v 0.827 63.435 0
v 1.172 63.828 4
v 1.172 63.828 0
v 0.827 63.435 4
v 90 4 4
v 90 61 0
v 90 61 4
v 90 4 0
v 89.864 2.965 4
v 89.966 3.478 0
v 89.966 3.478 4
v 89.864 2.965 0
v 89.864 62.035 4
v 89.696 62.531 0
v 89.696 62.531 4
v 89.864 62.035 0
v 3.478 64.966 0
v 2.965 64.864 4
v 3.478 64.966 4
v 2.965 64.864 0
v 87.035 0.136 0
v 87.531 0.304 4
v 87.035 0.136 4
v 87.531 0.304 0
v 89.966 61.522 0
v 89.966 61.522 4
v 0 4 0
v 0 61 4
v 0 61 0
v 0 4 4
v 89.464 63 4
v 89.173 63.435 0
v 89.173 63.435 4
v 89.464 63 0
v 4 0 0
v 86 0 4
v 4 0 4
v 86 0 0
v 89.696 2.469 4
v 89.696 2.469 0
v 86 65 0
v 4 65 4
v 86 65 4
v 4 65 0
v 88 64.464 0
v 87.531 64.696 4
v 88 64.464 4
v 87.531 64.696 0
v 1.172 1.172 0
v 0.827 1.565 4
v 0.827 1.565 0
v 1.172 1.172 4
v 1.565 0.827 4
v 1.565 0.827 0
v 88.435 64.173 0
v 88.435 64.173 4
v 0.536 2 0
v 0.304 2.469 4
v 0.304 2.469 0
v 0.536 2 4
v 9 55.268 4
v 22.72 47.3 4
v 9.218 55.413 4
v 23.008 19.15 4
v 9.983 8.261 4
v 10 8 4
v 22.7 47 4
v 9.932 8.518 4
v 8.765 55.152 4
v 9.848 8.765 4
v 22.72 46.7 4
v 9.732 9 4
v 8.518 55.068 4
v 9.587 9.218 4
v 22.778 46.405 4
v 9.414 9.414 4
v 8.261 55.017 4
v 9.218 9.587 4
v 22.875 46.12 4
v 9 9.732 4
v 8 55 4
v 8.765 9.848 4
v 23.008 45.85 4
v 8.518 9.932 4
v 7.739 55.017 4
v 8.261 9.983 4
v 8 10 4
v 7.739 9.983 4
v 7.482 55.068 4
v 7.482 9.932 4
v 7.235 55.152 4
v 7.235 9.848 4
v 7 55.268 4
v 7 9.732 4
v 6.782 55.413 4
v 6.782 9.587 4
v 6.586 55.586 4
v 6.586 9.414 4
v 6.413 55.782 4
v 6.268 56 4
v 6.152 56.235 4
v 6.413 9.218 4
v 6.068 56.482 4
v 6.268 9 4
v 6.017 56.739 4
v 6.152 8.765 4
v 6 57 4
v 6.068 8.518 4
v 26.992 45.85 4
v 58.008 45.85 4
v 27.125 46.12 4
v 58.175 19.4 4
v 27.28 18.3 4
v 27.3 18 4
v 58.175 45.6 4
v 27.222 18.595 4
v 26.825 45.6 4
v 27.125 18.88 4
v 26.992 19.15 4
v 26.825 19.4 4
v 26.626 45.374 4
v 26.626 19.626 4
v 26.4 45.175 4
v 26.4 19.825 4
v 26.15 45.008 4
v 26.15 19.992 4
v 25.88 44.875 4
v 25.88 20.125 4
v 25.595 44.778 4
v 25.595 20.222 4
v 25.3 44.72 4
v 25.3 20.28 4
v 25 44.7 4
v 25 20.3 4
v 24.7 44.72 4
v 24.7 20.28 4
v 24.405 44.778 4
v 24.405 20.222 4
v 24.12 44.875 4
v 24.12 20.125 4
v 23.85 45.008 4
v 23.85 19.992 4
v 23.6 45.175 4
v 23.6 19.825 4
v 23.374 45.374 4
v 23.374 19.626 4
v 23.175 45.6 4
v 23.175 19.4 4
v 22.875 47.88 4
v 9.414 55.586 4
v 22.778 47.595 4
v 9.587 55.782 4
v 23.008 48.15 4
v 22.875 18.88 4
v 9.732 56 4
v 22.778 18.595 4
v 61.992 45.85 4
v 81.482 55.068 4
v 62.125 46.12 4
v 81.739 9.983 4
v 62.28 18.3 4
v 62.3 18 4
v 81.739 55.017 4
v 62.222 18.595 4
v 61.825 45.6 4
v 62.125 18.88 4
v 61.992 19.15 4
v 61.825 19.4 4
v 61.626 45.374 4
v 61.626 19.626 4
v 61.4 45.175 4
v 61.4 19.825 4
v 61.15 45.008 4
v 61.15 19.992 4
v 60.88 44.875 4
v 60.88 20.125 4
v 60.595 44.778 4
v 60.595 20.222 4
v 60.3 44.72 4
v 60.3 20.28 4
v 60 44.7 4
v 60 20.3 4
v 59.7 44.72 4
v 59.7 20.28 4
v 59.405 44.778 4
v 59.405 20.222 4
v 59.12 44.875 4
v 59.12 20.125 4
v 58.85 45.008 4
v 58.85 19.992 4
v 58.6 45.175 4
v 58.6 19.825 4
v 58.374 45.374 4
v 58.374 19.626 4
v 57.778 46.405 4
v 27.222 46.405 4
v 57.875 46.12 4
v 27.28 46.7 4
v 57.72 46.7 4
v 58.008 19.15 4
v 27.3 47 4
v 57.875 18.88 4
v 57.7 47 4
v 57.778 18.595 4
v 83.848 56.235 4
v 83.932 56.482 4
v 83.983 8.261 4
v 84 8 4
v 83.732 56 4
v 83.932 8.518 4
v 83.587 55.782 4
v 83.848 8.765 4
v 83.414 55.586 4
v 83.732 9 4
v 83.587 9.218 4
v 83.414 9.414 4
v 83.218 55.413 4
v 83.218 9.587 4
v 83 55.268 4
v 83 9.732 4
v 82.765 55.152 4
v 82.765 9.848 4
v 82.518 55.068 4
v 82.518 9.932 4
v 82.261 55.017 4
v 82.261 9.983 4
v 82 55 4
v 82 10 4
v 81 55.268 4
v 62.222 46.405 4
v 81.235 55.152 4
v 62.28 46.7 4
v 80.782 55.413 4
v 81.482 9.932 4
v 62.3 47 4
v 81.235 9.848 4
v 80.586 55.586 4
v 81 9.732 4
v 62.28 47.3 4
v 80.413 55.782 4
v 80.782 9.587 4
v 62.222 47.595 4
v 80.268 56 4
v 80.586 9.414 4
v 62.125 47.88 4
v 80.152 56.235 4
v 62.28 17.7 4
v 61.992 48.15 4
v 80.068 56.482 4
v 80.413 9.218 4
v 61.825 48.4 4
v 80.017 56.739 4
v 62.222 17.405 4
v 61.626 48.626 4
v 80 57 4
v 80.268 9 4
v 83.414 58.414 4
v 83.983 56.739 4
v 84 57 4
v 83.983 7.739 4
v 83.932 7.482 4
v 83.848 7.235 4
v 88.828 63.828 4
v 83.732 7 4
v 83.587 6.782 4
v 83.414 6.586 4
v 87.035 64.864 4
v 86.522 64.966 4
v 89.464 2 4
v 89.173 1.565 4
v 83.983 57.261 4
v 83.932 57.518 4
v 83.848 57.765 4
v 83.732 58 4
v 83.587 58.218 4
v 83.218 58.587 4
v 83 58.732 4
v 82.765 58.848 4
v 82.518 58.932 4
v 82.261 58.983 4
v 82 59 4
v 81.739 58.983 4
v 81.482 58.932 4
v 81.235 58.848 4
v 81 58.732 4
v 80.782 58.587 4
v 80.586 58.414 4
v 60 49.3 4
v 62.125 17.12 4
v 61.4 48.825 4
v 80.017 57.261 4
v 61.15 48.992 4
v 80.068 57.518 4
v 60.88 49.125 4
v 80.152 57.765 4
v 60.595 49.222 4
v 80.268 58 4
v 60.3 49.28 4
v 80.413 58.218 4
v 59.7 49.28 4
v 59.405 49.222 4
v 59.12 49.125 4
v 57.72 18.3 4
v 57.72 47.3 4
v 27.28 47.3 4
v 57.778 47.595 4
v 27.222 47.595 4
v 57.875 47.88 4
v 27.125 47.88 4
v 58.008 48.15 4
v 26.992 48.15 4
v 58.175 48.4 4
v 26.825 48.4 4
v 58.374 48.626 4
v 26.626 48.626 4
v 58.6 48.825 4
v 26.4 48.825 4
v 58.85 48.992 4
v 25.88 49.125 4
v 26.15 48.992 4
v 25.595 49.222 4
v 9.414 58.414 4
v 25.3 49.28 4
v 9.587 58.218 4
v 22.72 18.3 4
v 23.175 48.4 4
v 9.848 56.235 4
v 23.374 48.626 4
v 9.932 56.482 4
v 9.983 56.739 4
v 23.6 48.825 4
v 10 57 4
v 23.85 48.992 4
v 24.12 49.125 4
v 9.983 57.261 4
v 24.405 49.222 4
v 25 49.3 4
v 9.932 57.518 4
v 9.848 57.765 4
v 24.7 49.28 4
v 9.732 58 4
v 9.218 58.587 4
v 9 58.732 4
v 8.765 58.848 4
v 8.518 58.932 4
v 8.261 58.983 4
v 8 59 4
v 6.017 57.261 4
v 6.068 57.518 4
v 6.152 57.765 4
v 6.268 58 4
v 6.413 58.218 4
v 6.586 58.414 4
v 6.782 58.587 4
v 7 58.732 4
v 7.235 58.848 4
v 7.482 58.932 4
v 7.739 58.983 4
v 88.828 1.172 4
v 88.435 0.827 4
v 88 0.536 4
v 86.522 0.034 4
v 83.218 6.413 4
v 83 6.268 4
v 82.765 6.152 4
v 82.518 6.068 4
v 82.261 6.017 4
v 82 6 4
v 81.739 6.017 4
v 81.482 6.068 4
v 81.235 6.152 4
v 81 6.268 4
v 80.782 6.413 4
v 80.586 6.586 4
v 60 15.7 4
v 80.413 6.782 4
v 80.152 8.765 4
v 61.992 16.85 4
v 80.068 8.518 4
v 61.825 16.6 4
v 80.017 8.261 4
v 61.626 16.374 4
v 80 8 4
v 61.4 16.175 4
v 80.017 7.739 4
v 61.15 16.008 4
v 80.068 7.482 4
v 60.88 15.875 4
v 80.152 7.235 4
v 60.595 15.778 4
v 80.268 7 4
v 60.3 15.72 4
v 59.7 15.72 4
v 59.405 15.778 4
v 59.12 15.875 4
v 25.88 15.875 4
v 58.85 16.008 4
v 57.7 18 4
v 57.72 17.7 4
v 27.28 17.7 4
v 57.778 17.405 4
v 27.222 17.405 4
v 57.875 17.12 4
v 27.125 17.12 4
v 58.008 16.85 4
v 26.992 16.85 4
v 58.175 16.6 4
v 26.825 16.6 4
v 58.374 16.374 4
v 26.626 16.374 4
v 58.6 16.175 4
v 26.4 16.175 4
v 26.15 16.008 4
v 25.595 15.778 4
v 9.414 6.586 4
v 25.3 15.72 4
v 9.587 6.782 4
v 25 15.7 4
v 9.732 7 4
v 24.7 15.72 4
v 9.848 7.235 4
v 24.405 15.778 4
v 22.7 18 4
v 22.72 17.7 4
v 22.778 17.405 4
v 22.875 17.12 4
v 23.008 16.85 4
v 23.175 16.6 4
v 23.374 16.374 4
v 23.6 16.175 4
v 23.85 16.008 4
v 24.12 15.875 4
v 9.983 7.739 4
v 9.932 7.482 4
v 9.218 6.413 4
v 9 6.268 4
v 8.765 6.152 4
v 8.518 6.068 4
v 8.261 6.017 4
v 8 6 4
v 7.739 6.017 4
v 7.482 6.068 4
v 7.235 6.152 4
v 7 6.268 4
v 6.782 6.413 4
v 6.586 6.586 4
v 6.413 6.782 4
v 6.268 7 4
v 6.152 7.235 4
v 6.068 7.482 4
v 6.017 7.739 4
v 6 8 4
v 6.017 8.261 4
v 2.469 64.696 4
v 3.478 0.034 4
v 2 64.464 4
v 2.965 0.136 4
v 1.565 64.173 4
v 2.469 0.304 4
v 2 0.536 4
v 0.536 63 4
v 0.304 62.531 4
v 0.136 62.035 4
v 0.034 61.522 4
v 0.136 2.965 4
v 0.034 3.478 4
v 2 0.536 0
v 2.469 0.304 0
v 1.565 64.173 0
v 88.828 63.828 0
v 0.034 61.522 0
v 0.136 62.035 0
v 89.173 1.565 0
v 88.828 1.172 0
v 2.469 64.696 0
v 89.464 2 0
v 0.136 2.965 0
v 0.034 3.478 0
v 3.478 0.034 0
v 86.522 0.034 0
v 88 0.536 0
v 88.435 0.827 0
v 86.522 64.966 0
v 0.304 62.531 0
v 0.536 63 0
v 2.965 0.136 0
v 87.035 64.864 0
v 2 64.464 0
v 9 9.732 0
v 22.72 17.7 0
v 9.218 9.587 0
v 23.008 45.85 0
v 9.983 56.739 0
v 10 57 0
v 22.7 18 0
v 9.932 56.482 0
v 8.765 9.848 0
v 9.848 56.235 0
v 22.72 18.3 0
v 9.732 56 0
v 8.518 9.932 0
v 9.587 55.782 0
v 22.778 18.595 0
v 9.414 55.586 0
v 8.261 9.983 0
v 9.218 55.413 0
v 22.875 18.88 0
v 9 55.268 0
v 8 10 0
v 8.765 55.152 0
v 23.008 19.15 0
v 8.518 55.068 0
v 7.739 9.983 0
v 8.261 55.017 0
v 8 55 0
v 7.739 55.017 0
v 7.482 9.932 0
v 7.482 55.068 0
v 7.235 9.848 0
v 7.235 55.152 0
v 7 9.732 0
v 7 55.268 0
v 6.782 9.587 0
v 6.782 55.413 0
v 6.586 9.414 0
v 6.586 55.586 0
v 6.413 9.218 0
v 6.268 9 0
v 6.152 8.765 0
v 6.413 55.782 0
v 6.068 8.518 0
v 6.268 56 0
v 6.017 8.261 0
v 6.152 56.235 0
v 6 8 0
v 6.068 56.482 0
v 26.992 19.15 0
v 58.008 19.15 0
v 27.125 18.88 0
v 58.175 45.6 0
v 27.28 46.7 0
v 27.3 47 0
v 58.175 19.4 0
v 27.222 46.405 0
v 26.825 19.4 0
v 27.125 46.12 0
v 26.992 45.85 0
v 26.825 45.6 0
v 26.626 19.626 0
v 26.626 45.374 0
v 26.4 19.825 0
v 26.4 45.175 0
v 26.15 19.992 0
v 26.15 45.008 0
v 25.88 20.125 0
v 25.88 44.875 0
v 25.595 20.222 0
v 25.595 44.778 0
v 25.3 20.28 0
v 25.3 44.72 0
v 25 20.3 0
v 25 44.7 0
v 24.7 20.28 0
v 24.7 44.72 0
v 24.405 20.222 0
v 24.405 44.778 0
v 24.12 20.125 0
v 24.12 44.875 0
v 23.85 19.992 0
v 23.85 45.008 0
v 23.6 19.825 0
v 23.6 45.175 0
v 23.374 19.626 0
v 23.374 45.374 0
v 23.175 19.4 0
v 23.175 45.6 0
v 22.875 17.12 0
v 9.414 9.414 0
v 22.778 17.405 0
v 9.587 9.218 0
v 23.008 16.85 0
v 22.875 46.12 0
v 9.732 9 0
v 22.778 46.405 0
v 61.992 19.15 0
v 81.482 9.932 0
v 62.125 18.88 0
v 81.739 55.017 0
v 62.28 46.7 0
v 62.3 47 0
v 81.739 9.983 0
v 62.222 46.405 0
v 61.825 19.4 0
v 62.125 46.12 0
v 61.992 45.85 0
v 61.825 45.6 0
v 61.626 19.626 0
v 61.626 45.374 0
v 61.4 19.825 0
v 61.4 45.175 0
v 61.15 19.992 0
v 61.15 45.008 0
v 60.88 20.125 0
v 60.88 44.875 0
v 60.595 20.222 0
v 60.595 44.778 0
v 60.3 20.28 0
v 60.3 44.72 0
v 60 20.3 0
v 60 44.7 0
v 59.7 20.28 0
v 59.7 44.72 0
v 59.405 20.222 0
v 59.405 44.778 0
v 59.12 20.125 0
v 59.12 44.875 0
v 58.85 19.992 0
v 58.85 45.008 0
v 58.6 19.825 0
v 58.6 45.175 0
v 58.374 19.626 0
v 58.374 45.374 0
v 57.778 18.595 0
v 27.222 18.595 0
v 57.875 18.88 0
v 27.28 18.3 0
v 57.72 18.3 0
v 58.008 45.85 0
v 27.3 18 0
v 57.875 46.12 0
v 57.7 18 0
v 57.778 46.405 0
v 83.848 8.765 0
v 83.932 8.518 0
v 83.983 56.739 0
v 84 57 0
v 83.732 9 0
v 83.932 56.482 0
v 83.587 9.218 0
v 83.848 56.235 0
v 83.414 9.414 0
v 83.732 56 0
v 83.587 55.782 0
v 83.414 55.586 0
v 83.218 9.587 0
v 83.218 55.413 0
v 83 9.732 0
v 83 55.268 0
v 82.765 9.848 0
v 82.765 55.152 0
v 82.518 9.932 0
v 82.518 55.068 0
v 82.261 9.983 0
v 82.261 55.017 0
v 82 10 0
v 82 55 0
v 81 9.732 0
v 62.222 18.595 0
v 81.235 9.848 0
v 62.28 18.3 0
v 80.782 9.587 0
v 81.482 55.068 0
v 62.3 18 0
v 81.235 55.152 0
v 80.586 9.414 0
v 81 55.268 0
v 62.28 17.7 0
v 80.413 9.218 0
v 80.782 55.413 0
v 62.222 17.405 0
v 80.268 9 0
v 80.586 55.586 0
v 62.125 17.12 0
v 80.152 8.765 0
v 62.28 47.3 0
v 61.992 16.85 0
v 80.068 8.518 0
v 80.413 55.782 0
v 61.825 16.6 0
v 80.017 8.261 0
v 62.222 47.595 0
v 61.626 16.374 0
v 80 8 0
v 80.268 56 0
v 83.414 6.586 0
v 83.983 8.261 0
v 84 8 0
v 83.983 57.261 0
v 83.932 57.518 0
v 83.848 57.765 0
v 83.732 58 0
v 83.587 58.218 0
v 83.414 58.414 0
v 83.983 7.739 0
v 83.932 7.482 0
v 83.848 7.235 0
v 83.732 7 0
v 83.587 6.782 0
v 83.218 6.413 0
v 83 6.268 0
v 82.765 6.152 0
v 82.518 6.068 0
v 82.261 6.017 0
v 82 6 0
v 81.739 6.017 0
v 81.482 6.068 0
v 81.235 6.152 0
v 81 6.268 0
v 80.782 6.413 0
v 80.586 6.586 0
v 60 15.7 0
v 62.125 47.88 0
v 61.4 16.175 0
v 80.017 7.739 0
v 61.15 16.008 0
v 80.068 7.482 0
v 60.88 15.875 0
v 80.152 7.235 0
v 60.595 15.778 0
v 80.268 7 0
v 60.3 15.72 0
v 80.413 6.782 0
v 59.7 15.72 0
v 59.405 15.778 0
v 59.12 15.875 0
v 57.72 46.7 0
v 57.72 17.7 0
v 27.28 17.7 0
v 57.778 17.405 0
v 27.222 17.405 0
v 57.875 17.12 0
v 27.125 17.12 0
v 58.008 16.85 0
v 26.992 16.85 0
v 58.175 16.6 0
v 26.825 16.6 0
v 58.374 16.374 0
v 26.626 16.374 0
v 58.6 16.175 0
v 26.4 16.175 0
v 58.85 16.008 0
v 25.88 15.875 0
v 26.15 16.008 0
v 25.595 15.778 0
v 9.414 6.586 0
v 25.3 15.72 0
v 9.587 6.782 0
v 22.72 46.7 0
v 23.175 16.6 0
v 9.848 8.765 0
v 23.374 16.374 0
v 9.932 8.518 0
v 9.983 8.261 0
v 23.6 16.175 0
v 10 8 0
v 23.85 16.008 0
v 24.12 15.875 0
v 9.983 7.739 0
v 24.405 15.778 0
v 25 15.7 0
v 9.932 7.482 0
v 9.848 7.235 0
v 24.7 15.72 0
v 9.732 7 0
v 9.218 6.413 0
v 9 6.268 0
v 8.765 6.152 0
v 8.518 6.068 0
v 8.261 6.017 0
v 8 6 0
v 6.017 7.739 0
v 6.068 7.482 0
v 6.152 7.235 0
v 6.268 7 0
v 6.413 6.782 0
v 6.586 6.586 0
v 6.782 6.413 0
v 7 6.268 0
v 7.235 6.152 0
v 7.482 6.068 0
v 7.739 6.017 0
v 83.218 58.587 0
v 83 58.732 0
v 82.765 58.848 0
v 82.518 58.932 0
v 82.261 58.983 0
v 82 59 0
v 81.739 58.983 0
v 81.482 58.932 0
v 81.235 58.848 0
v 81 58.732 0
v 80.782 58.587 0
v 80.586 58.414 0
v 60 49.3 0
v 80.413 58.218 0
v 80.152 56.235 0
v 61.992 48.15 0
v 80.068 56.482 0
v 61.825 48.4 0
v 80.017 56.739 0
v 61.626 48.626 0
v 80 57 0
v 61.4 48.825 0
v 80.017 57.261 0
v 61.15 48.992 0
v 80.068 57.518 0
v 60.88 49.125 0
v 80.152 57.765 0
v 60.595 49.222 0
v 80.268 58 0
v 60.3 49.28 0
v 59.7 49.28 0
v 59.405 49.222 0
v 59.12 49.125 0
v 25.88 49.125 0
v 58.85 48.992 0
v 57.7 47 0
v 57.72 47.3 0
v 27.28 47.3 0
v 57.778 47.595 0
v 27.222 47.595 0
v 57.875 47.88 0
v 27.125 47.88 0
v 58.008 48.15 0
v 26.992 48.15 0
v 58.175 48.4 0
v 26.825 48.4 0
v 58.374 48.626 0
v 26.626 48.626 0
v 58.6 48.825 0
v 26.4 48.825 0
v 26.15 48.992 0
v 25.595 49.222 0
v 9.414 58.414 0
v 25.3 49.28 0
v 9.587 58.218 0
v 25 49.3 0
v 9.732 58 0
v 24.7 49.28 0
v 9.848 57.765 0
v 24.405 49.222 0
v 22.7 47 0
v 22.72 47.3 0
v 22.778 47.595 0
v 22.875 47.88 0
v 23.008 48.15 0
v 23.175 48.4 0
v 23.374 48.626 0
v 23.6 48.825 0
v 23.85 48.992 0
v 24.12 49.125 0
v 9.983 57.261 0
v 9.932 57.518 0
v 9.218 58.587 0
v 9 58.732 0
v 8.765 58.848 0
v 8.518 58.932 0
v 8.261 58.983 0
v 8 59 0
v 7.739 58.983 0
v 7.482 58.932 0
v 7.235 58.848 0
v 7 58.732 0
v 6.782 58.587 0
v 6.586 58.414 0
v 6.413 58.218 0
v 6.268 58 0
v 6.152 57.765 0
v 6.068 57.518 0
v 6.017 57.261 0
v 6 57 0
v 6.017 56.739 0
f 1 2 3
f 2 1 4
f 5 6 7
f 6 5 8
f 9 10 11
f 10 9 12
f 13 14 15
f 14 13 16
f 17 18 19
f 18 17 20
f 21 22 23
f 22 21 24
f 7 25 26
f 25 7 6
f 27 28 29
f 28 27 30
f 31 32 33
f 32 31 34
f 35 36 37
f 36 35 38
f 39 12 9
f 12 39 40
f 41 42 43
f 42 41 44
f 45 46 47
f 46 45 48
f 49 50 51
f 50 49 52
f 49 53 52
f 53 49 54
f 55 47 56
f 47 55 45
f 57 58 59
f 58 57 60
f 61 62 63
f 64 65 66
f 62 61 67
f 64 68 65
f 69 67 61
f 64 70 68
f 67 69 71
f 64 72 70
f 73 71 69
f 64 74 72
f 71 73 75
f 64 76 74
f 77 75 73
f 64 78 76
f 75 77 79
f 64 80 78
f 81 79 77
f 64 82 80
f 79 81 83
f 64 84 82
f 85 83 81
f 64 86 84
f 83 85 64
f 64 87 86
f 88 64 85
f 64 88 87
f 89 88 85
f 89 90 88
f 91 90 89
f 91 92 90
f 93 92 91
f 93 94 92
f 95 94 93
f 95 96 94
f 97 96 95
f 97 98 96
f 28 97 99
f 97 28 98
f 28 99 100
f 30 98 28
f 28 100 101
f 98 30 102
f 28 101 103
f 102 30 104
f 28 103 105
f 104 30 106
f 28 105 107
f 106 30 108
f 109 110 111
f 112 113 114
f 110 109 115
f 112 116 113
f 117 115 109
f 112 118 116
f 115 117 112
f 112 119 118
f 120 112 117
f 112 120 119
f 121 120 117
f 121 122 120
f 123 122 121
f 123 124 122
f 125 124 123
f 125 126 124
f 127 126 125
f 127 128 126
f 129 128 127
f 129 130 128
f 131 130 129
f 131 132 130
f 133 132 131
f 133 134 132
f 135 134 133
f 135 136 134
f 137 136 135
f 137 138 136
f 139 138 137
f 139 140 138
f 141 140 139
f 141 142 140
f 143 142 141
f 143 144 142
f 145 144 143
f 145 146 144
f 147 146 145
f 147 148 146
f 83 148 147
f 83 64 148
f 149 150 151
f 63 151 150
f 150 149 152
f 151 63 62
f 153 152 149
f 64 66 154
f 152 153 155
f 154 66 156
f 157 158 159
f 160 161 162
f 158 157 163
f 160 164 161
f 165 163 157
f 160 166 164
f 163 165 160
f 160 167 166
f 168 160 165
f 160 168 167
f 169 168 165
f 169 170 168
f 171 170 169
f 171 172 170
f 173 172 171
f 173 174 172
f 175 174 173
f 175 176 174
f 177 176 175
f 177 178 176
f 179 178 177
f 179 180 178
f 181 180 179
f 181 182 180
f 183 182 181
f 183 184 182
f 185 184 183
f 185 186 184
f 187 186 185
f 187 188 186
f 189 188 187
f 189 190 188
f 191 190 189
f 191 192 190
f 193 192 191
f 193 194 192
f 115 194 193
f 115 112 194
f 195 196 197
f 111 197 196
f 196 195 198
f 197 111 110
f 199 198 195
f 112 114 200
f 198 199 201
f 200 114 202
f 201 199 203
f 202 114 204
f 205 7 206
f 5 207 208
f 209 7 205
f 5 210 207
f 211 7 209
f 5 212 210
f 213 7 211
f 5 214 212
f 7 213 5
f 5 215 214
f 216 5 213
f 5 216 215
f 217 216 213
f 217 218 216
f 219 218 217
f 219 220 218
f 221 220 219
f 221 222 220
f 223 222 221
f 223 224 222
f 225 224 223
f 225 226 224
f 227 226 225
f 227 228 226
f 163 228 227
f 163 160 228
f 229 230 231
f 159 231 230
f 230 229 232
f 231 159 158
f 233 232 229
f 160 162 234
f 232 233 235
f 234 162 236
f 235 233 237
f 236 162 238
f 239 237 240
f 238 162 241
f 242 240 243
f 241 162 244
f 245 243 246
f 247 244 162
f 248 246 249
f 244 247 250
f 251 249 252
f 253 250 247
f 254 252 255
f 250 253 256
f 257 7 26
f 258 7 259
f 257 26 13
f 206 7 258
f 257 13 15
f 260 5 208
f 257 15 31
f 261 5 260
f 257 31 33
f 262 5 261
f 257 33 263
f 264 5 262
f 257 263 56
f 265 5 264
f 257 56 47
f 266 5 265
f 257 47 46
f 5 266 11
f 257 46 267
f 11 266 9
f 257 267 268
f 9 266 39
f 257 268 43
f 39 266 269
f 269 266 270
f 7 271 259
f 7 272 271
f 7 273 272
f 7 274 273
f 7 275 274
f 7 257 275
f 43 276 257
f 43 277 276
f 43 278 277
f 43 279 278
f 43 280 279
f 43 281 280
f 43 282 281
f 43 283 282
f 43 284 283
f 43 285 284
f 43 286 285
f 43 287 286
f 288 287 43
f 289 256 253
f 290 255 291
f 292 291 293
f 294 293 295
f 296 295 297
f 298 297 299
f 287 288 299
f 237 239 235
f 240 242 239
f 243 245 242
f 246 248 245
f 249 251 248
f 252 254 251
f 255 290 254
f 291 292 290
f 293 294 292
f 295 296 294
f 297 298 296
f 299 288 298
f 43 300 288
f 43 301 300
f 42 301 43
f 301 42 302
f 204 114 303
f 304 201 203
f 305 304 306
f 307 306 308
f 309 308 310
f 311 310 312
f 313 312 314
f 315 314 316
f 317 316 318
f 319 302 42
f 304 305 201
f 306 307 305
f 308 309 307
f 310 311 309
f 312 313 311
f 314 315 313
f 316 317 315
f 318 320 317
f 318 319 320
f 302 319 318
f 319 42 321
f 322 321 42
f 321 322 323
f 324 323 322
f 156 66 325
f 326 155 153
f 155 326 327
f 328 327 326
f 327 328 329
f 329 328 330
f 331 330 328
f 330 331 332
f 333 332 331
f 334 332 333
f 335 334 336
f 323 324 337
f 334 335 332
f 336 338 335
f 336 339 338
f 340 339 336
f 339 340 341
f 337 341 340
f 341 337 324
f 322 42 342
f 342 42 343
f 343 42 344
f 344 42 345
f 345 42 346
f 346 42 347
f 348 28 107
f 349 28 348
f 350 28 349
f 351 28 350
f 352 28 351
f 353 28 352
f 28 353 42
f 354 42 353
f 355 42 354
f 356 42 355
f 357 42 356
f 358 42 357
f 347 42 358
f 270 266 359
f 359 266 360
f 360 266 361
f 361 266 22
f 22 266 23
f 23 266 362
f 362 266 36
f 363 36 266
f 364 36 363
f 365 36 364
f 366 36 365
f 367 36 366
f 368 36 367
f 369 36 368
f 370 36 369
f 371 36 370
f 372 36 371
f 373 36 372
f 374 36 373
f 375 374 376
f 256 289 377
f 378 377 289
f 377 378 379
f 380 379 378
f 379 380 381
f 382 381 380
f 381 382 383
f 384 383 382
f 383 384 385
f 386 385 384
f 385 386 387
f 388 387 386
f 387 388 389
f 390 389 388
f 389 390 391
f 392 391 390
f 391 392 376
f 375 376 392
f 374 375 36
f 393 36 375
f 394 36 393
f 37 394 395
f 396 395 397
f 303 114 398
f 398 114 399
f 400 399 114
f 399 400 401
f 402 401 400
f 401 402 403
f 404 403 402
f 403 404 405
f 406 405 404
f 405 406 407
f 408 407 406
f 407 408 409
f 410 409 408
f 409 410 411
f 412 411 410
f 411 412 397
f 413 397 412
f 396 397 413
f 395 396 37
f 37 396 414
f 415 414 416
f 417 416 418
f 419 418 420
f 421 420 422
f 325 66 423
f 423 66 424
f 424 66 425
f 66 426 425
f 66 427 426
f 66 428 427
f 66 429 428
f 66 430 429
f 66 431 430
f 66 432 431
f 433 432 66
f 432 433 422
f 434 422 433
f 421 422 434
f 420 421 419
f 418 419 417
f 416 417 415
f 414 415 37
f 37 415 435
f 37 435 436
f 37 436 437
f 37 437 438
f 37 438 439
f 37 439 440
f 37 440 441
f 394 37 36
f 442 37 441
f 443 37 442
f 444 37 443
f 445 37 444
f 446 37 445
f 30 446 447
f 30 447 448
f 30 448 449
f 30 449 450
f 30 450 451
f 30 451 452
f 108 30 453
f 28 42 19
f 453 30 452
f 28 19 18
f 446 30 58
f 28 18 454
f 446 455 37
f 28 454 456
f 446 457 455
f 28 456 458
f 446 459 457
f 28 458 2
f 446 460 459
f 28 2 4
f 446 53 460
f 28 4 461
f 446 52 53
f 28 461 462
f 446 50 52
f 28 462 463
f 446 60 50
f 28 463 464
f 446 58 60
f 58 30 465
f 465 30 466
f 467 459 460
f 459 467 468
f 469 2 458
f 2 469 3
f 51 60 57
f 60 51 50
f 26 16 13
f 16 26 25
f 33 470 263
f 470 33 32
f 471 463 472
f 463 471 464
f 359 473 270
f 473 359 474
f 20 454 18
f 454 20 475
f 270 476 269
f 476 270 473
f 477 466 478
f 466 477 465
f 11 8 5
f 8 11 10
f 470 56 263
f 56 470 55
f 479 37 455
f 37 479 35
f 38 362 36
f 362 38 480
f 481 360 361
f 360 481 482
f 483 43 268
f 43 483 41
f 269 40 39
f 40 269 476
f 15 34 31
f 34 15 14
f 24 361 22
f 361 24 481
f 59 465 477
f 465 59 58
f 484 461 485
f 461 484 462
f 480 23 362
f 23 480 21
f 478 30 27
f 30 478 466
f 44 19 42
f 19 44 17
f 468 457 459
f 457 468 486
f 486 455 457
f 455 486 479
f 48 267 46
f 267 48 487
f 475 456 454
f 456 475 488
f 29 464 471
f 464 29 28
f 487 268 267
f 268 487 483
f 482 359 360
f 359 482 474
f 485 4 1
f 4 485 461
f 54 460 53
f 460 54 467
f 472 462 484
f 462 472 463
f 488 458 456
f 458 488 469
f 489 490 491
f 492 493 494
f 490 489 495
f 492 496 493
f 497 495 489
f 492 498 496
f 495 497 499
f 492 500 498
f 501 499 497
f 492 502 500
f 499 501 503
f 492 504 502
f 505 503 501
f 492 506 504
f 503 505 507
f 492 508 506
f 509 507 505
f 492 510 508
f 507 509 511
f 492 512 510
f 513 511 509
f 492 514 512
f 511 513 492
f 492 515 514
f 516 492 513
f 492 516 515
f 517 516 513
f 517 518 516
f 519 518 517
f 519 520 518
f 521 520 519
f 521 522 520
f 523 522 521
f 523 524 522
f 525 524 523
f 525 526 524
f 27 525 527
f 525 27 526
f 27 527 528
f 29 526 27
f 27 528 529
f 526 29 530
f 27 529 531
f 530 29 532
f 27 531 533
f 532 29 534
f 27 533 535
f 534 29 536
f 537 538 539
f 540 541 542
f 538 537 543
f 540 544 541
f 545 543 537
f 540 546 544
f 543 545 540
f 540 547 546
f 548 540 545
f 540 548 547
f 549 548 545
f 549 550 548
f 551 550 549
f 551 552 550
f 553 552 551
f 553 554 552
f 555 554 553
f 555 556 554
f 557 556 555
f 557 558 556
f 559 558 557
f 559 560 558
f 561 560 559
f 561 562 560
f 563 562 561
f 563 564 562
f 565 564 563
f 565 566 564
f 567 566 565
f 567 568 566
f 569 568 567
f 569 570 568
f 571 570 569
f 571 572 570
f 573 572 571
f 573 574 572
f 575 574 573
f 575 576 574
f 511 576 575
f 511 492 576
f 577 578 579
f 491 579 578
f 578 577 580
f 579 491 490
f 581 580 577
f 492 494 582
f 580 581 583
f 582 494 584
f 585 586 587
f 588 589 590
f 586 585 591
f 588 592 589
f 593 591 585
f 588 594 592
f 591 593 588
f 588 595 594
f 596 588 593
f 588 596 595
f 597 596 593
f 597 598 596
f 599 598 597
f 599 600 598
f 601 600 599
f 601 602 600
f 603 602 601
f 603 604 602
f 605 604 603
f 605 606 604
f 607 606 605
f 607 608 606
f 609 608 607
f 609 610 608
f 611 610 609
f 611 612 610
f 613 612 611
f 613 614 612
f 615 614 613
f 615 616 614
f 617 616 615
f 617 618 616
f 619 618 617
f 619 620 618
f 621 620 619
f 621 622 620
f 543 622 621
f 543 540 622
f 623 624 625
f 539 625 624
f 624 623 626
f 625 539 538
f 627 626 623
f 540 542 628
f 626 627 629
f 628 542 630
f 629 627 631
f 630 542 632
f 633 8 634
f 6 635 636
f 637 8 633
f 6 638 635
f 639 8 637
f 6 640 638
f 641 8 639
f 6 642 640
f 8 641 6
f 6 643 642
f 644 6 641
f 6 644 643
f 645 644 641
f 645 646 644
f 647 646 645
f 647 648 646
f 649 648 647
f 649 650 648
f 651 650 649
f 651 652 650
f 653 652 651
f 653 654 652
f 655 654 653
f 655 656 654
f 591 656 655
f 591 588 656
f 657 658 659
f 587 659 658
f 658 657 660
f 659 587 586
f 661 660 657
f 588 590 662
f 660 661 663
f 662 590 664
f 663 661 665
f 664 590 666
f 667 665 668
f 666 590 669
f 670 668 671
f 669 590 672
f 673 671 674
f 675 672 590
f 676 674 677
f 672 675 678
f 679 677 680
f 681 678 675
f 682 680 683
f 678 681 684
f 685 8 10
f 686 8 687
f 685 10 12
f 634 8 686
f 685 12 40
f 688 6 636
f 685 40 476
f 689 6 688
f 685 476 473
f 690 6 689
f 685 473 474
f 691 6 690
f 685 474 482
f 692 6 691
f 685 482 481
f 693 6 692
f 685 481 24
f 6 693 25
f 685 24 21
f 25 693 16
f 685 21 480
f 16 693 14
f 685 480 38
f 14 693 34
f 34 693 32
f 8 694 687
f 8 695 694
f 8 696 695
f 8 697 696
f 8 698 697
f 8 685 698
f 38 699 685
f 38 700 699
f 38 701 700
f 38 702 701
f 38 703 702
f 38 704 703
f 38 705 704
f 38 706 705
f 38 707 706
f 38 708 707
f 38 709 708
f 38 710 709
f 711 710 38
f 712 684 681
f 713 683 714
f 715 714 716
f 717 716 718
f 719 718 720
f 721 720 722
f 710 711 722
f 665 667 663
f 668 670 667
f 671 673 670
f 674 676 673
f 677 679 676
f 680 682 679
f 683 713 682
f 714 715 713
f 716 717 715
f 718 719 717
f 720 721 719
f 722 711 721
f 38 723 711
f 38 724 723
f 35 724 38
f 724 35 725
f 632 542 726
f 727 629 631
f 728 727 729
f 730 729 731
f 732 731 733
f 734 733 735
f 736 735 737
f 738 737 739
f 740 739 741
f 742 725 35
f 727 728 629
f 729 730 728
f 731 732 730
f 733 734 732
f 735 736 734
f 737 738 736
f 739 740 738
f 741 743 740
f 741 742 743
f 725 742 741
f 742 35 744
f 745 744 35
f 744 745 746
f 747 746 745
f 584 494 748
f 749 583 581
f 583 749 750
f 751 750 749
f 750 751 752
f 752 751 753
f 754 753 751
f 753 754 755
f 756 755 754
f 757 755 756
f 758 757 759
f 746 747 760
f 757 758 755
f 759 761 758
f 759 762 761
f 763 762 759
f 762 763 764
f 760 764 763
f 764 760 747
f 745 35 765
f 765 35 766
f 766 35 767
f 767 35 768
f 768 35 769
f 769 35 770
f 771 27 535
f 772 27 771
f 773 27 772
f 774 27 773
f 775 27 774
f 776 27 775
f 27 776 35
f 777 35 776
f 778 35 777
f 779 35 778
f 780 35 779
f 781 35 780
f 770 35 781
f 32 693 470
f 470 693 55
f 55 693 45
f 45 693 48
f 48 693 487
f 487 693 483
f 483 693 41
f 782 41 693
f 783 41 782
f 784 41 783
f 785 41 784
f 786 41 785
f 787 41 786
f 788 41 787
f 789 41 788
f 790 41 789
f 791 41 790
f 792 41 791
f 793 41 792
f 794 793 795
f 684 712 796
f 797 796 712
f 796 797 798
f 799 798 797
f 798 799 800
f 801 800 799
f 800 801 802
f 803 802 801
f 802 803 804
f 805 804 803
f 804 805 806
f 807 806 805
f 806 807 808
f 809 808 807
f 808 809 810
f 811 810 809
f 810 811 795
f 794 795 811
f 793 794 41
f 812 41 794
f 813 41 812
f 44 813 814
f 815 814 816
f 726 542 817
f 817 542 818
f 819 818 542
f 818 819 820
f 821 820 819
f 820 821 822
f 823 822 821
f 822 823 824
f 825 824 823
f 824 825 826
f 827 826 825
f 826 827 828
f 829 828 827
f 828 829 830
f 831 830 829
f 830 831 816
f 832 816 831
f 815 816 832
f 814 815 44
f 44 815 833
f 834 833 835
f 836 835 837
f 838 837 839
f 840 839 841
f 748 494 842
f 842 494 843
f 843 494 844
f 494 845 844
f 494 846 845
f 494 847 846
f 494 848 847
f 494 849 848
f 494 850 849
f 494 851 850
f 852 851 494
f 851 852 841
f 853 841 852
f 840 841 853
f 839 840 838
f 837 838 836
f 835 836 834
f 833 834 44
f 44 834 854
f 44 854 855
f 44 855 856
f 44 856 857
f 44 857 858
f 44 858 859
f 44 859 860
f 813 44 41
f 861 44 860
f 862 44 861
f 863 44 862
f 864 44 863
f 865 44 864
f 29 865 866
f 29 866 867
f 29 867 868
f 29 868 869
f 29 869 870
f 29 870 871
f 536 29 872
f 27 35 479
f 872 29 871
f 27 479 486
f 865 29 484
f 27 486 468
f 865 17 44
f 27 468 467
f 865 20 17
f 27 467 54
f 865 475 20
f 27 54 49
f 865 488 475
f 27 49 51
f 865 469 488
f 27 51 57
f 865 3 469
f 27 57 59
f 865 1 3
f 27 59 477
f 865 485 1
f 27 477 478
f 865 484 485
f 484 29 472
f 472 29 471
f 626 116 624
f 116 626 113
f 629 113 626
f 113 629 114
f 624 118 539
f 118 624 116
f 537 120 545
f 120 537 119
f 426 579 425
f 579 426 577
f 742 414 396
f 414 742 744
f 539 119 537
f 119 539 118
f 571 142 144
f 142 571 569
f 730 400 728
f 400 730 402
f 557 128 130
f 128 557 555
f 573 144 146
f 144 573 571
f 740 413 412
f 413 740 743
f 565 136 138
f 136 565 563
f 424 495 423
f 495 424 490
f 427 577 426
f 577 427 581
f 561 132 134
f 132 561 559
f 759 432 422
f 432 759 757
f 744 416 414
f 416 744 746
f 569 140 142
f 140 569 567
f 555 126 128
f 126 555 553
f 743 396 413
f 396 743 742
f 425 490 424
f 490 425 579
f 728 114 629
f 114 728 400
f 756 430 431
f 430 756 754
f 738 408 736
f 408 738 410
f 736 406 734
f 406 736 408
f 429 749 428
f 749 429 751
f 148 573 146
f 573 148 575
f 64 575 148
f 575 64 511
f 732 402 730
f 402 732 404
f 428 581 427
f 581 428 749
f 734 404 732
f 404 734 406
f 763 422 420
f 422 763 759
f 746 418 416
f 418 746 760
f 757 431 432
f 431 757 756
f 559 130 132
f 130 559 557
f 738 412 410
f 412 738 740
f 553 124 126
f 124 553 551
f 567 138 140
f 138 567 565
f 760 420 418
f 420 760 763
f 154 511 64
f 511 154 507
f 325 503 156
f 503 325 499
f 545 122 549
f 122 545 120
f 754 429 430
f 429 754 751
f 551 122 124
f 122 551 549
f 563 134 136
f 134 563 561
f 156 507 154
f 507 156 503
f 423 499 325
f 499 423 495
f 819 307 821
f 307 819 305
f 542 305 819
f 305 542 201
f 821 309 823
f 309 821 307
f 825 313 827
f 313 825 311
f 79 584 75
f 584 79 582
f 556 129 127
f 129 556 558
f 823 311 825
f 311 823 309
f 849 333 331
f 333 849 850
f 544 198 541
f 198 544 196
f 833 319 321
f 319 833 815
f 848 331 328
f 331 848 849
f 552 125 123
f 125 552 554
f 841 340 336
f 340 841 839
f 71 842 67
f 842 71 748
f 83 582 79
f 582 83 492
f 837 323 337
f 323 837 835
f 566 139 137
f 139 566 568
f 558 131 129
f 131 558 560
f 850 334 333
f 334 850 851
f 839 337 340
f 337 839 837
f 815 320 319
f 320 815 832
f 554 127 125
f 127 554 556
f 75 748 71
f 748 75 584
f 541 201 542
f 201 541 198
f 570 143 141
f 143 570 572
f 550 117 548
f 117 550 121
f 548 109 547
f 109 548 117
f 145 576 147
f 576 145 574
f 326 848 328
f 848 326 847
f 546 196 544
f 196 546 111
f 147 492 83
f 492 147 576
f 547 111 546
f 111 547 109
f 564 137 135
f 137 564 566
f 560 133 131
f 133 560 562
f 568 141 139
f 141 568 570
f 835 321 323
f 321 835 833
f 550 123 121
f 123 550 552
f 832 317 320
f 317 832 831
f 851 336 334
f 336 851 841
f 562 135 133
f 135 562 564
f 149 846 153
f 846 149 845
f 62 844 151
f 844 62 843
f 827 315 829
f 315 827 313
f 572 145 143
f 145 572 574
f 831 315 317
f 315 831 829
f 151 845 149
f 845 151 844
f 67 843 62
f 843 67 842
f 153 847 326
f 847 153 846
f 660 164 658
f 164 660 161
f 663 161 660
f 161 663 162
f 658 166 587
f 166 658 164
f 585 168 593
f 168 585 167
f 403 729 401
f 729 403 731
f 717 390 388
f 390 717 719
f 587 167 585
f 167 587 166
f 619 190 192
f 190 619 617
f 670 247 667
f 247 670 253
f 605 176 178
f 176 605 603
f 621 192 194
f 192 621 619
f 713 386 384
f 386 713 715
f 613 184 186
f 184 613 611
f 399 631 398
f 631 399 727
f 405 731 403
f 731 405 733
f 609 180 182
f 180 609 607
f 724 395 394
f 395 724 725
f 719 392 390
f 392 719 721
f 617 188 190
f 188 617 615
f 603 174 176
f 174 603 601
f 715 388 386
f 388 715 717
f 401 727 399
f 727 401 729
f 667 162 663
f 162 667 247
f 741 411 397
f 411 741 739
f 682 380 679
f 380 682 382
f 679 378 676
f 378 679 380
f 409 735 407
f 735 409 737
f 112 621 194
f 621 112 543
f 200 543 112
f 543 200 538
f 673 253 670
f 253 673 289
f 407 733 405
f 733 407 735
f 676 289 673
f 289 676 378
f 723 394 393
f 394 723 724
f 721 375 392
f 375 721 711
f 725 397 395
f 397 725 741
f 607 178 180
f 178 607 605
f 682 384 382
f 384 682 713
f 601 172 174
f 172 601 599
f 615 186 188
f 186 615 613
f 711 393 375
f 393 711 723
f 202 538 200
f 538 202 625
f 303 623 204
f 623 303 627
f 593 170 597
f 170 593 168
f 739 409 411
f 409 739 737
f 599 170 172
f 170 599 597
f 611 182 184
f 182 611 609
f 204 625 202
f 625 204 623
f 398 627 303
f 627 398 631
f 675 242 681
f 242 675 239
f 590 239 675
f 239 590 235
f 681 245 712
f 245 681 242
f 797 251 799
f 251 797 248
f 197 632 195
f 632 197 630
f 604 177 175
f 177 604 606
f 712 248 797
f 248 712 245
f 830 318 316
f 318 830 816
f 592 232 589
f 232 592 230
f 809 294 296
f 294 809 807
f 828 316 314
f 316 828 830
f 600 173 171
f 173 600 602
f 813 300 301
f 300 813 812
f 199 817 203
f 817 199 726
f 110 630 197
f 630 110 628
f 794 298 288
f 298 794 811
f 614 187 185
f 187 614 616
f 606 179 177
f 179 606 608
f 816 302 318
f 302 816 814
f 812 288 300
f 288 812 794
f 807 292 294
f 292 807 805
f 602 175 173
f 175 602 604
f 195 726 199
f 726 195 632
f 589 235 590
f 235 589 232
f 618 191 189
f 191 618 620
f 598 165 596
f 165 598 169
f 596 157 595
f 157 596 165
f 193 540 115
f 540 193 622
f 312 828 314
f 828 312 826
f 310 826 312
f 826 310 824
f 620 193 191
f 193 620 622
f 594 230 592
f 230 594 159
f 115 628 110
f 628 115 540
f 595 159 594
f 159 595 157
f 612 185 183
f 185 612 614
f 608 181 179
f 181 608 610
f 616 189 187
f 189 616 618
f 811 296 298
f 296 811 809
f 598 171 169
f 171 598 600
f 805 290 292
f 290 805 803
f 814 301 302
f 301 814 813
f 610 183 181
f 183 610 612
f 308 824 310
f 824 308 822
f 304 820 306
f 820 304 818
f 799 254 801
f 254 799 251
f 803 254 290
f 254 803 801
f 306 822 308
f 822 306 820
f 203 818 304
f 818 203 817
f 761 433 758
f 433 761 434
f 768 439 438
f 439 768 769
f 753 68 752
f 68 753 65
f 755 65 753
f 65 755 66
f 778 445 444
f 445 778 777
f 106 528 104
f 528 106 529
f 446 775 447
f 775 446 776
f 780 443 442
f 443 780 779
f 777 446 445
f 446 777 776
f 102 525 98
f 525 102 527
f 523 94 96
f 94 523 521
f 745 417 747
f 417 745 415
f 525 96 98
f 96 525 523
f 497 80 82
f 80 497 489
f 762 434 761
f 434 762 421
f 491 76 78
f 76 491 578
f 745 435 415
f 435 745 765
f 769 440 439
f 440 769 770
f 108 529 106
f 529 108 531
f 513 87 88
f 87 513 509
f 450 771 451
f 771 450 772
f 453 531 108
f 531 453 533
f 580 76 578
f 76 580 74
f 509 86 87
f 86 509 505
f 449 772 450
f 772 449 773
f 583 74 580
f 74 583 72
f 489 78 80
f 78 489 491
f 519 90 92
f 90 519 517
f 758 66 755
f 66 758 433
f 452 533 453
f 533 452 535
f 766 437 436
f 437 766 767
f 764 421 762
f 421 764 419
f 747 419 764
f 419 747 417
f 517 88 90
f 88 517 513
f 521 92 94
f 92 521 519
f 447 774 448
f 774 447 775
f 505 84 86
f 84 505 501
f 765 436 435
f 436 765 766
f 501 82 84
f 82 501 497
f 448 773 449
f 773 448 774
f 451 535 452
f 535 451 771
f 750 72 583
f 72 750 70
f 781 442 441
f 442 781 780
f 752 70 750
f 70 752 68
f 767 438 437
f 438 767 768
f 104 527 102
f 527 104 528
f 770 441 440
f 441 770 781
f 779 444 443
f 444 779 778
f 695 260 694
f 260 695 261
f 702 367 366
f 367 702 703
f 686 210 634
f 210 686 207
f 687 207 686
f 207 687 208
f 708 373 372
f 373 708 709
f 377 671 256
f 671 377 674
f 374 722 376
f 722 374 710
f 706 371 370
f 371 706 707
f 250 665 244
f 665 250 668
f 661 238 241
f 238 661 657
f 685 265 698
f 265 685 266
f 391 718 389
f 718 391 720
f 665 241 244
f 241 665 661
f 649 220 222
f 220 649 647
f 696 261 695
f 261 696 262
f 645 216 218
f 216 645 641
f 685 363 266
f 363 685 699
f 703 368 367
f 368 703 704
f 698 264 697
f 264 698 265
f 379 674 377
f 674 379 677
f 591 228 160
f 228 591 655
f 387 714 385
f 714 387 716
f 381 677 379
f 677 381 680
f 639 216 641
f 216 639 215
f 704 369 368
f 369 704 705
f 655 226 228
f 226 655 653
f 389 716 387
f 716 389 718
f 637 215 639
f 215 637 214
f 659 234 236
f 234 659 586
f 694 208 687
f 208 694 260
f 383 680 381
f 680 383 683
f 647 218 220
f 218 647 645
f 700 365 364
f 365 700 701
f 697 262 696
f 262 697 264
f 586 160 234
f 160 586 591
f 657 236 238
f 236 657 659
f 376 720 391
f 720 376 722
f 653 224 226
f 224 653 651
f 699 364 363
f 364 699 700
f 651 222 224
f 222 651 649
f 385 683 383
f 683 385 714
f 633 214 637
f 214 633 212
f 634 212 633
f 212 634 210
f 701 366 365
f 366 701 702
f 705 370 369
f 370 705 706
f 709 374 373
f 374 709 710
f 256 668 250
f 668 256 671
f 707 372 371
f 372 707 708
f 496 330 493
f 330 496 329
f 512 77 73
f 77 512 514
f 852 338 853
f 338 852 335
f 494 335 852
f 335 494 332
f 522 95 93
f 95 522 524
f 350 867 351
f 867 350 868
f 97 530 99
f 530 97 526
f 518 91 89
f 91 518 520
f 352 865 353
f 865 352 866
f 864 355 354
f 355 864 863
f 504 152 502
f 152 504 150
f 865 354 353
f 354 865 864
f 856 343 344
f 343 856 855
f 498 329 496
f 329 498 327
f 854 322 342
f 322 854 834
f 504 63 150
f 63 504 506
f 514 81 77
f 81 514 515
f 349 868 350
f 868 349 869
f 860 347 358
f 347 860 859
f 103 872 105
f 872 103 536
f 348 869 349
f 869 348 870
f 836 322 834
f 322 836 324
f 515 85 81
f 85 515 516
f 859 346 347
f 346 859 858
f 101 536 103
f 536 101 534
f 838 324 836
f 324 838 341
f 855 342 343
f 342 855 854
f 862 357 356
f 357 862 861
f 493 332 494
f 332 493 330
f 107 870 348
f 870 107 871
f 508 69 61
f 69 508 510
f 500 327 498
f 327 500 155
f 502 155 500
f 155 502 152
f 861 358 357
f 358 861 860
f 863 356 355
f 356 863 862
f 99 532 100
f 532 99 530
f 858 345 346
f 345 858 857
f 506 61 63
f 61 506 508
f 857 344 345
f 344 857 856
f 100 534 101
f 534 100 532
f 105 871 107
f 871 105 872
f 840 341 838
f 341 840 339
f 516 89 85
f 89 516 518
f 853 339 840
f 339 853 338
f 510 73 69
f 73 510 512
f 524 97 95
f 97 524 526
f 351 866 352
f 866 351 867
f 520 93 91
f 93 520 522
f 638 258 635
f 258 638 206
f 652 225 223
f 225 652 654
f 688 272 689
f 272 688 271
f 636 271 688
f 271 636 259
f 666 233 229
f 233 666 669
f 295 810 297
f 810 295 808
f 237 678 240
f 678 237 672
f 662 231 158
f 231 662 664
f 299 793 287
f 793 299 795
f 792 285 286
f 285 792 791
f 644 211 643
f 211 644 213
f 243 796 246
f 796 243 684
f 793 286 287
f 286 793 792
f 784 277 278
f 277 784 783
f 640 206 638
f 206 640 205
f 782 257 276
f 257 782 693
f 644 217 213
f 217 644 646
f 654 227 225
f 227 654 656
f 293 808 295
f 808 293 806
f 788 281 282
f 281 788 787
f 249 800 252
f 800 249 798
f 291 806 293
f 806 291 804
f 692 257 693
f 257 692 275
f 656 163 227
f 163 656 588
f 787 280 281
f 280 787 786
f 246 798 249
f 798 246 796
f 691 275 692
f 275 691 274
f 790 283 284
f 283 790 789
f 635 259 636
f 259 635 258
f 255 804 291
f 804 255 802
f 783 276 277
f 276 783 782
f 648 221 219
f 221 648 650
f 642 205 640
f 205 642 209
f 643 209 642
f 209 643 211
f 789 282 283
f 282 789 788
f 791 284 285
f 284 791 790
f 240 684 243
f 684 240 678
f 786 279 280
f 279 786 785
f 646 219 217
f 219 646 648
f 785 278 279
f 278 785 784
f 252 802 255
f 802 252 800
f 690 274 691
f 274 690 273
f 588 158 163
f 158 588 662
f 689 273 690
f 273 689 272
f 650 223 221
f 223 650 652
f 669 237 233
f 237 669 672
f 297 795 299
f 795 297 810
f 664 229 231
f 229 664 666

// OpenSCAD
$fn=48;
module rounded_plate(x=90,y=65,z=4,r=4){hull(){translate([r,r,0])cylinder(h=z,r=r);translate([x-r,r,0])cylinder(h=z,r=r);translate([r,y-r,0])cylinder(h=z,r=r);translate([x-r,y-r,0])cylinder(h=z,r=r);}}
difference(){rounded_plate();translate([25,18,-1])cylinder(h=6,r=2.3);translate([25,47,-1])cylinder(h=6,r=2.3);translate([60,18,-1])cylinder(h=6,r=2.3);translate([60,47,-1])cylinder(h=6,r=2.3);translate([8,8,-1])cylinder(h=6,r=2);translate([82,8,-1])cylinder(h=6,r=2);translate([8,57,-1])cylinder(h=6,r=2);translate([82,57,-1])cylinder(h=6,r=2);}
